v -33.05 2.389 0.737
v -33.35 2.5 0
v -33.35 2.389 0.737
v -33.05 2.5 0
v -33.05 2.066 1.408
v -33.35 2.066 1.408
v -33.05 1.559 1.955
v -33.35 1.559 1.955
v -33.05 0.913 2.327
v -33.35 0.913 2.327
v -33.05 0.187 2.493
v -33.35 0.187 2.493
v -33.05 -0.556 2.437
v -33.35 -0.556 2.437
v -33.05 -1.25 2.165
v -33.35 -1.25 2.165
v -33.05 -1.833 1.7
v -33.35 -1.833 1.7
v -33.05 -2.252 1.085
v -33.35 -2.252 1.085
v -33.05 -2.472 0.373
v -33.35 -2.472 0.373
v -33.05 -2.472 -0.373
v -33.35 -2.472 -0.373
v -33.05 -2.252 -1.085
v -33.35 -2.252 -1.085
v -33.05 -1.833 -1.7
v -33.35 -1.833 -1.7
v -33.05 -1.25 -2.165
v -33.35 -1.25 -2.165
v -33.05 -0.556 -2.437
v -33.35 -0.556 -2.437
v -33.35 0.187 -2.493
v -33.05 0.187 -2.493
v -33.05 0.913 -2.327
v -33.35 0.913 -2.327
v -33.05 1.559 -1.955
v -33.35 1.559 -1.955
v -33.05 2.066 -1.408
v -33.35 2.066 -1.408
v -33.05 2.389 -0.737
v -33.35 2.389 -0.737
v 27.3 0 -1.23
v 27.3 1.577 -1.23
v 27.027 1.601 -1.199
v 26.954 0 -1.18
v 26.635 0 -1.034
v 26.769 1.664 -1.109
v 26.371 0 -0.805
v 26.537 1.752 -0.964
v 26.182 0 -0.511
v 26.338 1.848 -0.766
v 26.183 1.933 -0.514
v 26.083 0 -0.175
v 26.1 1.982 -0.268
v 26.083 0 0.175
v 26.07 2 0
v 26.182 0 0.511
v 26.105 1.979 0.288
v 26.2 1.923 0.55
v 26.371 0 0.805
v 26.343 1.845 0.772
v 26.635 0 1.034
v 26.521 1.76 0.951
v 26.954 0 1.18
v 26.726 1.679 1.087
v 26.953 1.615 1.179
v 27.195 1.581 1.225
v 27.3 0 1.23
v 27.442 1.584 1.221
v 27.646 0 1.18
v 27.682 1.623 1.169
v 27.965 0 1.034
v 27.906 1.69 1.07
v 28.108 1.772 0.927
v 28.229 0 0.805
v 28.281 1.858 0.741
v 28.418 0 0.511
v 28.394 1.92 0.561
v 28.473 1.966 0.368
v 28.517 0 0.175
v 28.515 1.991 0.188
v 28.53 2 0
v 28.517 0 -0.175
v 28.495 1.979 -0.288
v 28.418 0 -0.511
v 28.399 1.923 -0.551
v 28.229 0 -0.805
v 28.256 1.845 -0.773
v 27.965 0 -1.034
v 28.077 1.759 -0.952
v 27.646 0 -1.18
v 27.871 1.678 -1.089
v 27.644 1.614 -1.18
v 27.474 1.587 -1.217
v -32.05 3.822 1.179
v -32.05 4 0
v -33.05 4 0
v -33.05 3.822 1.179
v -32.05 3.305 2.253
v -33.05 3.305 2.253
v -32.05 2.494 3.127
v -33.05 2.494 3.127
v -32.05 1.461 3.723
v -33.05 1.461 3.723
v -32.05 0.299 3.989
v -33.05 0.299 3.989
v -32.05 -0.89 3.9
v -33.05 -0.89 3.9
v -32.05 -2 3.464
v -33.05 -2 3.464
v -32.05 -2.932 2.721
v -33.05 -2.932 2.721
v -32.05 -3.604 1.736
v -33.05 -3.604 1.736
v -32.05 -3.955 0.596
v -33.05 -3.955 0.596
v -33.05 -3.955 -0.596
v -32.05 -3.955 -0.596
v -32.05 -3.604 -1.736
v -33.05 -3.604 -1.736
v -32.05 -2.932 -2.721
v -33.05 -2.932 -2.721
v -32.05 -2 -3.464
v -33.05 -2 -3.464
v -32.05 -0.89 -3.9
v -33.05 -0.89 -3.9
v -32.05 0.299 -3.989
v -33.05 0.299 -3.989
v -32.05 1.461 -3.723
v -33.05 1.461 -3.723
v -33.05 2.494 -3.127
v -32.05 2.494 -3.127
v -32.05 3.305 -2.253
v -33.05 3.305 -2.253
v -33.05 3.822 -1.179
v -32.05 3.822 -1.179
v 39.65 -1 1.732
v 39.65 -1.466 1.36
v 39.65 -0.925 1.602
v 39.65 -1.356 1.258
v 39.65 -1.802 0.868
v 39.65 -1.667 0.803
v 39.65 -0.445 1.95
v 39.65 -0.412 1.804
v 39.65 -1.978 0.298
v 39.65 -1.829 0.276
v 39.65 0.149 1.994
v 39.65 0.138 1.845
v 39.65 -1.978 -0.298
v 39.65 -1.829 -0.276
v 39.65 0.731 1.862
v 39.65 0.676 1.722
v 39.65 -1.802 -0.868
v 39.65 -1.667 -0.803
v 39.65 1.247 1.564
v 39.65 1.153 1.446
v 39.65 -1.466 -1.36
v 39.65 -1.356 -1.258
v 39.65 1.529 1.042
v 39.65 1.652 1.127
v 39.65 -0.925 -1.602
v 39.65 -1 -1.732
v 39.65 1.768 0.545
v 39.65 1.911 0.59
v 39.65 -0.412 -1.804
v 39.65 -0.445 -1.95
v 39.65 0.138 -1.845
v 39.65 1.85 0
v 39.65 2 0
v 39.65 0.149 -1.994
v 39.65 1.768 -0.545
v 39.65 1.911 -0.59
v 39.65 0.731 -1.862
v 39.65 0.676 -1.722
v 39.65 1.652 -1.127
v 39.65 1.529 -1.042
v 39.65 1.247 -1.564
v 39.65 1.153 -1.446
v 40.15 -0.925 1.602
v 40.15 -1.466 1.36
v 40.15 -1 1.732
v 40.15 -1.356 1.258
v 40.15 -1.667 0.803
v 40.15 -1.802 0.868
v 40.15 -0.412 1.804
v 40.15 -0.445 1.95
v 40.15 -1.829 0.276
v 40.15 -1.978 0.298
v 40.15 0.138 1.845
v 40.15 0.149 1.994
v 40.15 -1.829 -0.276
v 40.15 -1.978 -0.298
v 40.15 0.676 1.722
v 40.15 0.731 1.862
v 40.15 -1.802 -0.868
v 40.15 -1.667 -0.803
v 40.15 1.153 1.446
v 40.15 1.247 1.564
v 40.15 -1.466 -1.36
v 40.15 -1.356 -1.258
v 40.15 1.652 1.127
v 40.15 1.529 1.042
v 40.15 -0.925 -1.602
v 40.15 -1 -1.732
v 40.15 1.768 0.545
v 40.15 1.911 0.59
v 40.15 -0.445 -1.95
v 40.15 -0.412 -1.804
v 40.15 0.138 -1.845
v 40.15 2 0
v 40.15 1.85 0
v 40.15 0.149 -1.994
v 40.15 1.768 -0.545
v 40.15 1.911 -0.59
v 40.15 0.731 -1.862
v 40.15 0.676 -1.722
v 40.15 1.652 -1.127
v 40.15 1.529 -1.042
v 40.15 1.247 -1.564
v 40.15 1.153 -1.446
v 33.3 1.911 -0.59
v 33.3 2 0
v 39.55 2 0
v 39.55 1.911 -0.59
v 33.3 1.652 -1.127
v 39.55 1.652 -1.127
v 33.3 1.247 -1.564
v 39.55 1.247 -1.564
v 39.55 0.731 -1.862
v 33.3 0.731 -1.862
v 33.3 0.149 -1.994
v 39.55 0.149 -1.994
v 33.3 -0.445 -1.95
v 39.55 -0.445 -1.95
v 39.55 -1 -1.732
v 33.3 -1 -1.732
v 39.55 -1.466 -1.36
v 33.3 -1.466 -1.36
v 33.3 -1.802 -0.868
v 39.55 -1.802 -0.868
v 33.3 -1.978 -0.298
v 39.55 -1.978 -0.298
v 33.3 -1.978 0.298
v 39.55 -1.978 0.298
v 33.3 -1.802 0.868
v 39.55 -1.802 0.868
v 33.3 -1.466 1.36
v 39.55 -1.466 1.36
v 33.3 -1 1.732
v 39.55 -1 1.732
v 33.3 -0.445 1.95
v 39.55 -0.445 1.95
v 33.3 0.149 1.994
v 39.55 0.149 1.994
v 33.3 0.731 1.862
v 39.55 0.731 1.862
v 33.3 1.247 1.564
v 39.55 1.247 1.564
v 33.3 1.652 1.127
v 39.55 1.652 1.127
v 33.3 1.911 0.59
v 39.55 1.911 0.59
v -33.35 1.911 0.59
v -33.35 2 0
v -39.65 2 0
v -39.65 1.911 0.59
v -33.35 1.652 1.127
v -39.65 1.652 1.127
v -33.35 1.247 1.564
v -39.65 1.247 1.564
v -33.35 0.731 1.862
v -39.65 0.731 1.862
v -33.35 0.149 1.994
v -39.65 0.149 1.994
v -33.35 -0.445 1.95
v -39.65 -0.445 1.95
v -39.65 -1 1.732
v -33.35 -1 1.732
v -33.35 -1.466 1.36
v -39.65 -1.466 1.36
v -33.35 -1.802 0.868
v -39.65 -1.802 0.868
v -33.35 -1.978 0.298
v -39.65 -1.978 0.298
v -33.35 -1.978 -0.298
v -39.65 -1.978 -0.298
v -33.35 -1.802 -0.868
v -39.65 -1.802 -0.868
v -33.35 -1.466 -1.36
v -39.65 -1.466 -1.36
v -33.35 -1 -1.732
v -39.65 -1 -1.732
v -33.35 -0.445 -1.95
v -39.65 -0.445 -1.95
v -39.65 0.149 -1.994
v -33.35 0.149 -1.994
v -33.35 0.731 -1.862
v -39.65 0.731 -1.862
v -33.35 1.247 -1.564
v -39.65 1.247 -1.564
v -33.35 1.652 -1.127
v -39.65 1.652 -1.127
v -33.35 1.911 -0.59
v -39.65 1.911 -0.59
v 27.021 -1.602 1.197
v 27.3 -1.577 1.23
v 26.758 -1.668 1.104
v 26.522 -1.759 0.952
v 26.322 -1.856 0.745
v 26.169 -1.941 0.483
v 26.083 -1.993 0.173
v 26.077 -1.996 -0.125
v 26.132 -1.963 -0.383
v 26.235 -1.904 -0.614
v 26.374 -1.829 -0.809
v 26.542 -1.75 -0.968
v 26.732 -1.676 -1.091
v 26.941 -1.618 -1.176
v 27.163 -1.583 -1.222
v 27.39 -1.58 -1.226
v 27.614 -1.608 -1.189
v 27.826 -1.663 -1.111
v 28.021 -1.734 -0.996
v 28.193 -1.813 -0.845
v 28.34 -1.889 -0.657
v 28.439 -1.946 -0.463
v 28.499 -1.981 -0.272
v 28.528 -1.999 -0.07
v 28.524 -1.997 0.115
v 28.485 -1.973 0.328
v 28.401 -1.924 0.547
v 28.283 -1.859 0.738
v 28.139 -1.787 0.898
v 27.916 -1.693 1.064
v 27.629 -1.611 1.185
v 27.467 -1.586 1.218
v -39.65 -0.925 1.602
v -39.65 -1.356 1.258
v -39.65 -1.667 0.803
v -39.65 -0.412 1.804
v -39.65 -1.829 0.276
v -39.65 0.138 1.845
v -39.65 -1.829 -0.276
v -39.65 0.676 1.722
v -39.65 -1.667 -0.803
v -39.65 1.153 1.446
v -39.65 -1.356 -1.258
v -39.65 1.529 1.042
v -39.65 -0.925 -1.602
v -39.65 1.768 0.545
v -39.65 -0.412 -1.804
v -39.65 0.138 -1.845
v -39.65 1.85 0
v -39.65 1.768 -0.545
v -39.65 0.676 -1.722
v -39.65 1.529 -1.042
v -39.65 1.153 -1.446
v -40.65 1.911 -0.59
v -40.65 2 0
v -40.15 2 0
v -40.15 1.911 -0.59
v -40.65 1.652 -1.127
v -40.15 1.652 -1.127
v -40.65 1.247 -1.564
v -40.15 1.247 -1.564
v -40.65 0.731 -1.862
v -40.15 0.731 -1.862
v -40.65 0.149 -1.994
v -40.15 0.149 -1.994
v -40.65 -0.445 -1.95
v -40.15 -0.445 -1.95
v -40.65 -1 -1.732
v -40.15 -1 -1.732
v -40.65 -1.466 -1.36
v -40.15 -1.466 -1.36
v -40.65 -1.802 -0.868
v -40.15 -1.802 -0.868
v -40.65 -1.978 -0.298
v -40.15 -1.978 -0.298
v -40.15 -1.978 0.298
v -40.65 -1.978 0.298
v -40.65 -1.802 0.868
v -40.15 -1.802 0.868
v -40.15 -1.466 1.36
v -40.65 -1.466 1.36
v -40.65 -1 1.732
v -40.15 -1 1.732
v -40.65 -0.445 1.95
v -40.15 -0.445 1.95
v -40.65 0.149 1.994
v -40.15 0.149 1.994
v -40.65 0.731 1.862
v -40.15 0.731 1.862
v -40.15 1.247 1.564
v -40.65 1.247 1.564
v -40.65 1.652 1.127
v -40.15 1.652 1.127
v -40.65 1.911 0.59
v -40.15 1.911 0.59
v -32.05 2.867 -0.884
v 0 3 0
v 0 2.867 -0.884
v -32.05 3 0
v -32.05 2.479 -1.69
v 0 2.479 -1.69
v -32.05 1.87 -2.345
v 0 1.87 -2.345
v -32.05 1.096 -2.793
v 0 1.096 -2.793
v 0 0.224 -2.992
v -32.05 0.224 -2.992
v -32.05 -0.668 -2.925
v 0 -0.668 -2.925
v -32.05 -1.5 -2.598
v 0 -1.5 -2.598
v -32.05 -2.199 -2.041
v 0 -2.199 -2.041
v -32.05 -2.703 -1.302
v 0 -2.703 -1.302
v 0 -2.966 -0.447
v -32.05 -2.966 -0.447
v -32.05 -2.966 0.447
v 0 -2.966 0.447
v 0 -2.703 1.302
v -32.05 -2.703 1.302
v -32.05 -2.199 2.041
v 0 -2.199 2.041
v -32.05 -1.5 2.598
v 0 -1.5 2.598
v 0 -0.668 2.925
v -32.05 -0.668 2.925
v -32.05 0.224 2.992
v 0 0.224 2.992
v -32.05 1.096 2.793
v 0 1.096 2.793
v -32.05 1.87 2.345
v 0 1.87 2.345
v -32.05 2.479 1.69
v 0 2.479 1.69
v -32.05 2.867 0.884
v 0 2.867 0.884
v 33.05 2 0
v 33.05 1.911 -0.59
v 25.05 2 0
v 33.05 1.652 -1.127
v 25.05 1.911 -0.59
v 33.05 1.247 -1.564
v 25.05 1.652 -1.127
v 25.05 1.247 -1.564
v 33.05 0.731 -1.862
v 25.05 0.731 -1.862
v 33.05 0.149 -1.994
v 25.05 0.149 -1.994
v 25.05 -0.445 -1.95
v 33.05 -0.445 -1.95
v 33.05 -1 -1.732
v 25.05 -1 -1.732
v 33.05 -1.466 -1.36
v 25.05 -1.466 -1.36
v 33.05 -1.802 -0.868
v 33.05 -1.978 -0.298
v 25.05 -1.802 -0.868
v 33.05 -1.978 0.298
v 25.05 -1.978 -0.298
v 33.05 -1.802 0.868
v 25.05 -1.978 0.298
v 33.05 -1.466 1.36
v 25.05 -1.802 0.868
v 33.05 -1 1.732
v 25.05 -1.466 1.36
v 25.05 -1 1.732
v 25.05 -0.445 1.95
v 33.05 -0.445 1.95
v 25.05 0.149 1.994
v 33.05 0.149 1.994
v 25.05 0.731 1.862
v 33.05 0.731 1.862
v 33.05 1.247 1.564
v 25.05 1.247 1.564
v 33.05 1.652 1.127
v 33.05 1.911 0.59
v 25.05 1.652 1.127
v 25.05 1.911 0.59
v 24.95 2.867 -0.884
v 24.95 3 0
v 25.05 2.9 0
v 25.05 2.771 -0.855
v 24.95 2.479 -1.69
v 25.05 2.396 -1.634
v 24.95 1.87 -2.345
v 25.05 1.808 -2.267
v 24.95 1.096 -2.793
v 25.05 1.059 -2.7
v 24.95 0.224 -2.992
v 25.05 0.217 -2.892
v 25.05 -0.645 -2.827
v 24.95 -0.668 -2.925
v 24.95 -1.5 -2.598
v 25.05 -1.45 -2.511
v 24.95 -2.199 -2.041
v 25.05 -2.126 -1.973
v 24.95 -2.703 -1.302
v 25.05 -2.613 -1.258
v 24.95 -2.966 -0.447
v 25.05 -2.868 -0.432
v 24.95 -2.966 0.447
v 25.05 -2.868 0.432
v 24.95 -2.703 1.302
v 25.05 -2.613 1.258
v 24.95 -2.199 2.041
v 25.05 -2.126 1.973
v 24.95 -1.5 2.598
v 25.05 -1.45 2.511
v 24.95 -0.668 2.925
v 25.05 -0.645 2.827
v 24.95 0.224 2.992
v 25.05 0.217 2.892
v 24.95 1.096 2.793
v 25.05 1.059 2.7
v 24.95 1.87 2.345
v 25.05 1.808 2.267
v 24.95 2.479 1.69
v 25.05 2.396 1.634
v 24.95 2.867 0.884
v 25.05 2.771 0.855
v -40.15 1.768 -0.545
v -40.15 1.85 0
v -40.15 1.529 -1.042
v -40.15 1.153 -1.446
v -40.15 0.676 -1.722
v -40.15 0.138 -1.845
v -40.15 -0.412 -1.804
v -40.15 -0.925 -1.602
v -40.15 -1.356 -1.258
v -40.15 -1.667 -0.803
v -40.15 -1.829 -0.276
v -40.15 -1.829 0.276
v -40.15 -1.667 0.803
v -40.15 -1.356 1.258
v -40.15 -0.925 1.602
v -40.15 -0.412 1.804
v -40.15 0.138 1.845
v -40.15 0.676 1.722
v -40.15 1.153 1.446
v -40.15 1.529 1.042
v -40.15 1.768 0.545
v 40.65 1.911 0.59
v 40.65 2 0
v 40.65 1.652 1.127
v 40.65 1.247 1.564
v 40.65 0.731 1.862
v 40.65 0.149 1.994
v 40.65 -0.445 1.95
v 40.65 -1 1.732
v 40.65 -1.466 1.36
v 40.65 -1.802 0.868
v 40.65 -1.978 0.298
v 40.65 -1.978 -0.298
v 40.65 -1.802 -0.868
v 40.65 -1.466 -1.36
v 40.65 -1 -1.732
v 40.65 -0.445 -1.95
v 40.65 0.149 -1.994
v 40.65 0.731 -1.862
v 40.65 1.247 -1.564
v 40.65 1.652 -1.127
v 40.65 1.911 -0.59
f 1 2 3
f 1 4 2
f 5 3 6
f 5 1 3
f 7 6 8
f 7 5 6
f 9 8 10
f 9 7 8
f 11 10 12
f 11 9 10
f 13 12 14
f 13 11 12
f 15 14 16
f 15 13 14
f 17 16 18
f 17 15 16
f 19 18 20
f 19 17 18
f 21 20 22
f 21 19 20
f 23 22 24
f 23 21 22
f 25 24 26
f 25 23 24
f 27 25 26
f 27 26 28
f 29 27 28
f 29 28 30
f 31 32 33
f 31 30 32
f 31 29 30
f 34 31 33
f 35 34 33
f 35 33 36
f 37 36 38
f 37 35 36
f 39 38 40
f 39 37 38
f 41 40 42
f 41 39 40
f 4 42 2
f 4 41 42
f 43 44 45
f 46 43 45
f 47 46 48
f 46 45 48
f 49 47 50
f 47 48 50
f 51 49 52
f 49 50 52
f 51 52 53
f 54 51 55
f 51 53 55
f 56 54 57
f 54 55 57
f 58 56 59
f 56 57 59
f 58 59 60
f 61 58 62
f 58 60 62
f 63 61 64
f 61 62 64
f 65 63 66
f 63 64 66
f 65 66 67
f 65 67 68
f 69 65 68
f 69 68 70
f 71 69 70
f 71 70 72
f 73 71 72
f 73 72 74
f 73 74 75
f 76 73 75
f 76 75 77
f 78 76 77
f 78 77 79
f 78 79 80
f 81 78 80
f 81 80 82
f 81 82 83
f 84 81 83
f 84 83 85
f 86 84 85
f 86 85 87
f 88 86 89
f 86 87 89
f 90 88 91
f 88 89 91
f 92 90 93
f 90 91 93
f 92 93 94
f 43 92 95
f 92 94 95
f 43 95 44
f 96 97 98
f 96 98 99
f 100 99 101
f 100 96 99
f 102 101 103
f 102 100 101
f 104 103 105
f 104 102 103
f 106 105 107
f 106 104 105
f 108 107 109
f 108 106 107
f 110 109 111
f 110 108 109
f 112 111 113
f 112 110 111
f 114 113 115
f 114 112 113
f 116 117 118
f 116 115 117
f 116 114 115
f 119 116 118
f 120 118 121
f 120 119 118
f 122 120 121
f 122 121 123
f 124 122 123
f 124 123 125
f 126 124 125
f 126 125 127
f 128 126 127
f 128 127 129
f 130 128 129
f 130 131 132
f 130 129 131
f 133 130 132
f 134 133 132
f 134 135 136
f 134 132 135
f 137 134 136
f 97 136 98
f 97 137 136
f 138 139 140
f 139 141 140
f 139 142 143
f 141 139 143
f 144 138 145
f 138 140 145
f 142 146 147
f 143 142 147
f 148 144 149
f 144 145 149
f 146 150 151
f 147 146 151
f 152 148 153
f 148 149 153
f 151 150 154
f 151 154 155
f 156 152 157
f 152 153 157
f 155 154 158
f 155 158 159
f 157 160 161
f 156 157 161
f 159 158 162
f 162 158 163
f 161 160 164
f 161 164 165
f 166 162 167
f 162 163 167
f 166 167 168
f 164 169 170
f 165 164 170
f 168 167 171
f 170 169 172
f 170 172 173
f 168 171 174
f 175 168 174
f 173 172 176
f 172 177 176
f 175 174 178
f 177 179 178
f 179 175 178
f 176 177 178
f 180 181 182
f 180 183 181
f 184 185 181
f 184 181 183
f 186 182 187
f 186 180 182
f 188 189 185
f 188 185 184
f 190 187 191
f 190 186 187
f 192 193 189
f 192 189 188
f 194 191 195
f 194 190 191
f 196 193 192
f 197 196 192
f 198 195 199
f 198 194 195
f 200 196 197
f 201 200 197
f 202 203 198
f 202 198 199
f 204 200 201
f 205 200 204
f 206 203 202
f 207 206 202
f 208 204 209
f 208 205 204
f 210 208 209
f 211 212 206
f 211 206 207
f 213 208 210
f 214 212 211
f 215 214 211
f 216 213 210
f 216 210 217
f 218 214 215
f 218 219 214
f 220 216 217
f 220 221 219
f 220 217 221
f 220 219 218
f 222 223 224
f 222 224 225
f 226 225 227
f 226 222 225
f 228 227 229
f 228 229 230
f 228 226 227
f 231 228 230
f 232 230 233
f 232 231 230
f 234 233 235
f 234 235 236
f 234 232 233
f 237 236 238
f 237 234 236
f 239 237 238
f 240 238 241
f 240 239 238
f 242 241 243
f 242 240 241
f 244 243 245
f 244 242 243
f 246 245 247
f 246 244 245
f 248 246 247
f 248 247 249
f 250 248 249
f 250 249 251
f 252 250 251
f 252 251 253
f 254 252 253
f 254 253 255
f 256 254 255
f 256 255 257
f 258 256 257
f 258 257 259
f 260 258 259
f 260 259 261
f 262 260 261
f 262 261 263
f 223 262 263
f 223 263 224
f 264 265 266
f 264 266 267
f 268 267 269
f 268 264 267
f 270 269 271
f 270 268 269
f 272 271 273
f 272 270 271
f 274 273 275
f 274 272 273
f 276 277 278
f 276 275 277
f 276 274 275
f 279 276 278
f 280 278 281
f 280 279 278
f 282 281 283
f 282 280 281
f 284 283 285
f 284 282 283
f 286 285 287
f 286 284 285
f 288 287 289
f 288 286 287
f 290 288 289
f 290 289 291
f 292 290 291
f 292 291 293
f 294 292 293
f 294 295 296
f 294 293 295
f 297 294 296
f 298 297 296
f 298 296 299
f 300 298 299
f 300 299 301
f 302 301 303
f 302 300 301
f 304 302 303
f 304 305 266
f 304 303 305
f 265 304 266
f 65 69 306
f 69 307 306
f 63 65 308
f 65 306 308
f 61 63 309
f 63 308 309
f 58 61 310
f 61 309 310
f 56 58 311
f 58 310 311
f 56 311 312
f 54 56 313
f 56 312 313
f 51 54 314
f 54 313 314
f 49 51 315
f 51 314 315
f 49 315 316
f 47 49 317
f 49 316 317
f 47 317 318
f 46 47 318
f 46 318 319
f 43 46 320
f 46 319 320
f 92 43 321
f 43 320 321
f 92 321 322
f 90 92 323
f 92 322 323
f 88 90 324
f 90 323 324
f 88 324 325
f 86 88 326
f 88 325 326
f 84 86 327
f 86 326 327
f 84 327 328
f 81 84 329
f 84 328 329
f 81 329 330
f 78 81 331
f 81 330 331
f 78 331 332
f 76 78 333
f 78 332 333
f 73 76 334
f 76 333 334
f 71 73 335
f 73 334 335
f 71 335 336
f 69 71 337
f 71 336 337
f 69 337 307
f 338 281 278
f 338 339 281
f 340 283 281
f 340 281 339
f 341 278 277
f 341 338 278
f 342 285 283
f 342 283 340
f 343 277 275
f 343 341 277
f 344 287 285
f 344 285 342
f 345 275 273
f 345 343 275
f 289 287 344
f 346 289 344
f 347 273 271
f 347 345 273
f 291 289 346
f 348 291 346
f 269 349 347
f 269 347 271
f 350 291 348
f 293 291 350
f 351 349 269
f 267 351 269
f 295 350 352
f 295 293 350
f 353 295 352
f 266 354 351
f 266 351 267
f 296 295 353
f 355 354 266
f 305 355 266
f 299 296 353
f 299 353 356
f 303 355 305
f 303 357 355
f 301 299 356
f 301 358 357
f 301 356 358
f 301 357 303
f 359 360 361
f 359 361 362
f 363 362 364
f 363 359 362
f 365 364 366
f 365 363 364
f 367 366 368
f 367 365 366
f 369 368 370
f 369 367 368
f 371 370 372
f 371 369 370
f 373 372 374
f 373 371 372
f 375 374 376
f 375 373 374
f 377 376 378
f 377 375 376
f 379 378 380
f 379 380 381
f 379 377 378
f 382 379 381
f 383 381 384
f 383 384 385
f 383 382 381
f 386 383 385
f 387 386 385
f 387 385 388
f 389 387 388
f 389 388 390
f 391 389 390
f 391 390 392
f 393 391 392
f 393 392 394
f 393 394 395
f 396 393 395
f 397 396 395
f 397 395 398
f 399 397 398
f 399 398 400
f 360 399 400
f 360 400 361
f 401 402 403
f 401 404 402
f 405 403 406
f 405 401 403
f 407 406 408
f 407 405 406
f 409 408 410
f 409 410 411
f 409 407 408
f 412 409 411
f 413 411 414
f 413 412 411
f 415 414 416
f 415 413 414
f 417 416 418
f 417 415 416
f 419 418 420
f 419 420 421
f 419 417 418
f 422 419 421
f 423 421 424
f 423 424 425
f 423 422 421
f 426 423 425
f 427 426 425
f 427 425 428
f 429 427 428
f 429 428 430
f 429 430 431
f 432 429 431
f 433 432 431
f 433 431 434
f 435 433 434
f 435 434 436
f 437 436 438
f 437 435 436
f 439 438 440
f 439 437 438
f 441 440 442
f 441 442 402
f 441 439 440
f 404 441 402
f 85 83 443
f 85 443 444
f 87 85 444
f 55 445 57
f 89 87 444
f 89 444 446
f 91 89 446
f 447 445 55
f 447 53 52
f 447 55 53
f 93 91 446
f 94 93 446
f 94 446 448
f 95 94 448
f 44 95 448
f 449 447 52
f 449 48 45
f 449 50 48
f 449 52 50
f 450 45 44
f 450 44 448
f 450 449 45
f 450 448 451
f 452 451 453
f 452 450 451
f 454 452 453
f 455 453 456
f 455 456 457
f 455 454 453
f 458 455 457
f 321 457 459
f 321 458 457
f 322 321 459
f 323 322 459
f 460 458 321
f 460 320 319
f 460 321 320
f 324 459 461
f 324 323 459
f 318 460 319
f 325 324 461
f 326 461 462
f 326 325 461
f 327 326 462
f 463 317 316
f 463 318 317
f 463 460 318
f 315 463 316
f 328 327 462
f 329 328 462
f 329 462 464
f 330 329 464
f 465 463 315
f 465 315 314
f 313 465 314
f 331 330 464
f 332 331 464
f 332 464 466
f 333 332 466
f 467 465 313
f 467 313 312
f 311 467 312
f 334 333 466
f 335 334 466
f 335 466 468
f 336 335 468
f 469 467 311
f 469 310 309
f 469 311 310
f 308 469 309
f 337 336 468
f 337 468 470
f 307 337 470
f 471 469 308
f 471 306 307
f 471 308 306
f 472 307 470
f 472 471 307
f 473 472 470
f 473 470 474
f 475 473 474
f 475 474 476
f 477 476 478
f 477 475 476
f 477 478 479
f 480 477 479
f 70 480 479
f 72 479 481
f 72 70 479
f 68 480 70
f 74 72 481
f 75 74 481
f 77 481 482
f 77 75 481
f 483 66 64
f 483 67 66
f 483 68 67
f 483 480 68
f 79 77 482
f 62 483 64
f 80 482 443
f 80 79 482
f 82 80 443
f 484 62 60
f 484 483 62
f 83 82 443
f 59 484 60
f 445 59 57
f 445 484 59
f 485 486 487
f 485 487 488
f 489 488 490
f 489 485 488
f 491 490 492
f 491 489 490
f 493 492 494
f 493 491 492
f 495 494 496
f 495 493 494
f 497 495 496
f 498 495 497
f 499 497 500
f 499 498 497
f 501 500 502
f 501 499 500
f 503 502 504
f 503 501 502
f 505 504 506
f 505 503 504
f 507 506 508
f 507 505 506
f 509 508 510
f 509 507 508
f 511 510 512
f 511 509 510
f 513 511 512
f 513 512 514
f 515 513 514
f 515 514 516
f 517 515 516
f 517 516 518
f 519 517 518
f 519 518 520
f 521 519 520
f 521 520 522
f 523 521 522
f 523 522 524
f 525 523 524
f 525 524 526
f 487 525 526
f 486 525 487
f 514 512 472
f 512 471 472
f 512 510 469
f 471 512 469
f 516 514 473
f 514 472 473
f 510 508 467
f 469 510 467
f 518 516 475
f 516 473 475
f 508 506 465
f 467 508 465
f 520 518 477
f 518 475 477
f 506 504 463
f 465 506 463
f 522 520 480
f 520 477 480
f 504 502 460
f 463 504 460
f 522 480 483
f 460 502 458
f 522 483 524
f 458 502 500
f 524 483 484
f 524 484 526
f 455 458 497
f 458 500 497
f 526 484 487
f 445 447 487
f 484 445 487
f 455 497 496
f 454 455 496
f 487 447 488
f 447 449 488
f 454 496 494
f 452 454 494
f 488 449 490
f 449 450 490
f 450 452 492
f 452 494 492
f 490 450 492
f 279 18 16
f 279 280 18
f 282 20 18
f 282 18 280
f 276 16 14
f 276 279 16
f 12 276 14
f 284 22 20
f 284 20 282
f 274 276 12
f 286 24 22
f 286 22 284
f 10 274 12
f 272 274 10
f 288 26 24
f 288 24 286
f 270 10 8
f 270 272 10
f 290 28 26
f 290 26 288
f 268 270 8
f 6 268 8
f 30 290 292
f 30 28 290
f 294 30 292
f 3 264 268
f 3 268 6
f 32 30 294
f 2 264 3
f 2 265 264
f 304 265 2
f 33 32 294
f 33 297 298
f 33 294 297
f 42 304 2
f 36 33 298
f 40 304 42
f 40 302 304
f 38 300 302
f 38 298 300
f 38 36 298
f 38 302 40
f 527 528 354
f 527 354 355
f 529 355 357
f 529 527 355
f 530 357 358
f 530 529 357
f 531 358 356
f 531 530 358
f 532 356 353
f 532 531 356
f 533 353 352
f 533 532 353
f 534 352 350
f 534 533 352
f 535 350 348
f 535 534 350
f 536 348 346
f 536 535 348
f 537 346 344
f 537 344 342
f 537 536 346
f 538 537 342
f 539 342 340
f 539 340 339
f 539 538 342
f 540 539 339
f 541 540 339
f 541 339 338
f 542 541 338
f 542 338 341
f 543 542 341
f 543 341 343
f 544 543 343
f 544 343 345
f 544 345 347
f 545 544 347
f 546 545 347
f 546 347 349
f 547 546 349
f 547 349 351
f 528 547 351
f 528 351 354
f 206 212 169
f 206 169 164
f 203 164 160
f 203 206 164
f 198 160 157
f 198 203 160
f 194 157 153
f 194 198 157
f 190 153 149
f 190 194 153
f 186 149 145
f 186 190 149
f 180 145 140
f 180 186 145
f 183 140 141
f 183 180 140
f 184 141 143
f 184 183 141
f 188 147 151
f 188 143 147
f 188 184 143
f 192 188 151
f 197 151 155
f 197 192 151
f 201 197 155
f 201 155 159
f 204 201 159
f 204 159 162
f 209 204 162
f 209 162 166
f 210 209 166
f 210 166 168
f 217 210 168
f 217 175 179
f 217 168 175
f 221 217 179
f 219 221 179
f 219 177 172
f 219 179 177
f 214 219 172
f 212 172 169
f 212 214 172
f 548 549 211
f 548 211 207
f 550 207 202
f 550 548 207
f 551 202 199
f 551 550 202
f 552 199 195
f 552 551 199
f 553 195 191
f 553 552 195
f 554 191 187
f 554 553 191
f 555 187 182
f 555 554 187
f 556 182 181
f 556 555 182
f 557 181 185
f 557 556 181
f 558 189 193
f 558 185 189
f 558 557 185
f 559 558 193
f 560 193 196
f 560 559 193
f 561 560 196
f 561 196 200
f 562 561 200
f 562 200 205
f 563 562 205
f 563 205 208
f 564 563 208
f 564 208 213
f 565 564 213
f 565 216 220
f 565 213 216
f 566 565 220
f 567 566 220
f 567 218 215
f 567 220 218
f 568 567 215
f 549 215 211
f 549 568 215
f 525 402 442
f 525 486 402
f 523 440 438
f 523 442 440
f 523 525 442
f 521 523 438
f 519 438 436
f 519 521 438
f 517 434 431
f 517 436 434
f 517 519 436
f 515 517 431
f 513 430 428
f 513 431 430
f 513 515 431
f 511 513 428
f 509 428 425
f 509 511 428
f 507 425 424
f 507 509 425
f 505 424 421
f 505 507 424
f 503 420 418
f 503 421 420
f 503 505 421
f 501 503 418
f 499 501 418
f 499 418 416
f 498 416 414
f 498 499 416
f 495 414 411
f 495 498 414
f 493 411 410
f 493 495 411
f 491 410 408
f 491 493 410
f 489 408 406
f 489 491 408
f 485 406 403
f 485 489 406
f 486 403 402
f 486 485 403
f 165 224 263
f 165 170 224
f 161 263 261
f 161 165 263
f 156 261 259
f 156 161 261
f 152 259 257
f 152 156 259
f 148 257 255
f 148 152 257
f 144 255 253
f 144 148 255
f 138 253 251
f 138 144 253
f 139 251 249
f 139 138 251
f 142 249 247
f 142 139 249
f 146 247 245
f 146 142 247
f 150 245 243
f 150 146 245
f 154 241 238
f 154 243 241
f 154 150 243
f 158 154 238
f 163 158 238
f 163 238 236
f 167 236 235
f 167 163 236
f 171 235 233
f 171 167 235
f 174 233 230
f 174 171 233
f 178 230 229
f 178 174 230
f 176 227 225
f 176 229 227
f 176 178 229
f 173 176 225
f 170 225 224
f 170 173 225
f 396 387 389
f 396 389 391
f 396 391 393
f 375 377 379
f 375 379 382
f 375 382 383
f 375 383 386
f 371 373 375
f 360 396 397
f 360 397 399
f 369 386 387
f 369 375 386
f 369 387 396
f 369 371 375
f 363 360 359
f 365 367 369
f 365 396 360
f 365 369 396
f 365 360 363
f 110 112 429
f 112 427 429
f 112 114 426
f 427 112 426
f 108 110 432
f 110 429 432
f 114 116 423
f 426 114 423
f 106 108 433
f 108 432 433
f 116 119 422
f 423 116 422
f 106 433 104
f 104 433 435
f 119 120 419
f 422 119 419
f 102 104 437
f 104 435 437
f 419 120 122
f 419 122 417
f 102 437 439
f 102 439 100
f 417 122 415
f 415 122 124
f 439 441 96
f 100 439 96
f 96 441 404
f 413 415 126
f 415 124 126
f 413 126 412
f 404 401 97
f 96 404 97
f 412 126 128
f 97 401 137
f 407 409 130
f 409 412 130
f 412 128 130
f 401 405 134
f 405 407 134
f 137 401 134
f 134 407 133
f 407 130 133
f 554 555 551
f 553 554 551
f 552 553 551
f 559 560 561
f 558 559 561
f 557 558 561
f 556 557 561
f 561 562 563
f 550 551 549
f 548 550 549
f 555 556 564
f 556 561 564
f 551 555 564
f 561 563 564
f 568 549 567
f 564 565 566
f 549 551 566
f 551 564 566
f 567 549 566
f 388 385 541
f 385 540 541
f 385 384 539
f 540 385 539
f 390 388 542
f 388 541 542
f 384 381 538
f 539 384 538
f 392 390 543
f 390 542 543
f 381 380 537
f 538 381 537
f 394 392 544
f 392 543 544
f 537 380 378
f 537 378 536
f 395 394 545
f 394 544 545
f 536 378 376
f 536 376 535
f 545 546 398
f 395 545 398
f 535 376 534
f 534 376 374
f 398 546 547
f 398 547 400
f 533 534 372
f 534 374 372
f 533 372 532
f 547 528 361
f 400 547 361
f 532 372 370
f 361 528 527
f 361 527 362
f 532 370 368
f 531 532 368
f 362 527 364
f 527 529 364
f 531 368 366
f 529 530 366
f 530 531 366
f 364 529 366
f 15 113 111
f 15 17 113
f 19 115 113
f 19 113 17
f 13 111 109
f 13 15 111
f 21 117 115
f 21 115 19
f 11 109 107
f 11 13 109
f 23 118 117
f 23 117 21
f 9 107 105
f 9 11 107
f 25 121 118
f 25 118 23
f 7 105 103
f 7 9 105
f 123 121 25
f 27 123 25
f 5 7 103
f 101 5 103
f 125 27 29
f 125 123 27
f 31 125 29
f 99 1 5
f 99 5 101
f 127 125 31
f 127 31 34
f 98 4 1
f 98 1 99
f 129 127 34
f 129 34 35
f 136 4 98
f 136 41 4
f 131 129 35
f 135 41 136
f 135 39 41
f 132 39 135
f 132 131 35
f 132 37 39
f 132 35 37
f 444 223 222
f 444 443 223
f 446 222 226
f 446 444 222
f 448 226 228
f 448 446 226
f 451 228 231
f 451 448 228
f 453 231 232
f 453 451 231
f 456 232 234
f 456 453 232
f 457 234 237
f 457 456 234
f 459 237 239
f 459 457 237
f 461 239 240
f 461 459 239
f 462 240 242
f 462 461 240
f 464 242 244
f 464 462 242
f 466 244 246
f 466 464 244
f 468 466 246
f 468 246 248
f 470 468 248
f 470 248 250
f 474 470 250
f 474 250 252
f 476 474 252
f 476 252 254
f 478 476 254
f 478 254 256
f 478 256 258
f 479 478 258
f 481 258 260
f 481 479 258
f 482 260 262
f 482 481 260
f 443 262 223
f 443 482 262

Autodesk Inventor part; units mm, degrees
ref_plane "YZ Plane" through (0, 0, 0) normal (1, 0, 0) x (0, 1, 0)
ref_plane "XZ Plane" through (0, 0, 0) normal (0, 1, 0) x (-1, 0, 0)
ref_plane "XY Plane" through (0, 0, 0) normal (0, 0, 1) x (1, 0, 0)
sketch "Skizze1" plane through (0, 0, 0) normal (0, 0, 1) x (1, 0, 0)
  line L0 (0, 0) -> (-39.55, 0)
  line L1 (-39.55, 0) -> (-39.55, 2)
  line L2 (-39.55, 2) -> (-33.35, 2)
  line L3 (-33.35, 2) -> (-33.35, 2.5)
  line L4 (-33.35, 2.5) -> (-33.05, 2.5)
  line L5 (-33.05, 2.5) -> (-33.05, 4)
  line L6 (-33.05, 4) -> (-32.05, 4)
  line L7 (-32.05, 4) -> (-32.05, 3)
  line L8 (0, 0) -> (0, 3) construction
  line L9 (0, 3) -> (-32.05, 3)
  line L10 (0, 0) -> (39.55, 0)
  line L11 (39.55, 0) -> (39.55, 2)
  line L12 (39.55, 2) -> (33.3, 2)
  line L13 (33.3, 2) -> (33.05, 2)
  line L14 (33.05, 2) -> (25.05, 2)
  line L15 (0, 3) -> (25.05, 3)
  line L16 (25.05, 3) -> (25.05, 2)
  line L17 (-39.55, 2) -> (-39.65, 2)
  line L18 (-39.65, 2) -> (-39.65, 1.85)
  line L19 (-39.65, 1.85) -> (-40.15, 1.85)
  line L20 (-40.15, 1.85) -> (-40.15, 2)
  line L21 (-40.15, 2) -> (-40.65, 2)
  line L22 (-40.65, 2) -> (-40.65, 0)
  line L23 (-40.65, 0) -> (-39.55, 0)
  line L24 (39.55, 2) -> (39.65, 2)
  line L25 (39.65, 2) -> (39.65, 1.85)
  line L26 (39.65, 1.85) -> (40.15, 1.85)
  line L27 (40.15, 1.85) -> (40.15, 2)
  line L28 (40.15, 2) -> (40.65, 2)
  line L29 (40.65, 2) -> (40.65, 0)
  line L30 (40.65, 0) -> (39.55, 0)
  dimension "d0" = 39.55
  dimension "d1" = 2
  dimension "d2" = 6.2
  dimension "d3" = 0.5
  dimension "d4" = 0.3
  dimension "d5" = 1.5
  dimension "d6" = 1
  dimension "d7" = 3
  dimension "d8" = 32.05
  dimension "d9" = 39.55
  dimension "d10" = 2
  dimension "d13" = 0.25
  dimension "d14" = 8
  dimension "d16" = 25.05
  dimension "d17" = 0.1
  dimension "d18" = 0.15
  dimension "d19" = 0.5
  dimension "d20" = 0.5
  dimension "d21" = 0.1
  dimension "d22" = 0.15
  dimension "d23" = 0.5
  dimension "d24" = 0.5
revolve "Umdrehung1" add sketch "Skizze1" angle 360 about axis through (0, 0, 0) along (-1, 0, 0)
sketch "Skizze2" plane through (0, 0, 0) normal (0, 1, 0) x (-1, 0, 0)
  line L0 (-25.05, -3) -> (-25.05, 3) projected
  line L1 (-25.05, 0) -> (-27.3, 0)
  point P0 (0, 0)
  dimension "d26" = 2.25
hole "Bohrung1" at (27.3, 0, 0) direction (0, -1, 0) diameter 2.459 depth 8.8 thread size "M3x0.5" class "6H" standard "ISO Metric profile"
hole "Bohrung2" at (27.3, 0, 0) direction (0, 1, 0) diameter 2.459 depth 8.8 thread size "M3x0.5" class "6H" standard "ISO Metric profile"
chamfer "Fasen1" distance 0.1 angle 45 1 edges at (25.05, -3, 0)
properties part number "DribblerWelle"
